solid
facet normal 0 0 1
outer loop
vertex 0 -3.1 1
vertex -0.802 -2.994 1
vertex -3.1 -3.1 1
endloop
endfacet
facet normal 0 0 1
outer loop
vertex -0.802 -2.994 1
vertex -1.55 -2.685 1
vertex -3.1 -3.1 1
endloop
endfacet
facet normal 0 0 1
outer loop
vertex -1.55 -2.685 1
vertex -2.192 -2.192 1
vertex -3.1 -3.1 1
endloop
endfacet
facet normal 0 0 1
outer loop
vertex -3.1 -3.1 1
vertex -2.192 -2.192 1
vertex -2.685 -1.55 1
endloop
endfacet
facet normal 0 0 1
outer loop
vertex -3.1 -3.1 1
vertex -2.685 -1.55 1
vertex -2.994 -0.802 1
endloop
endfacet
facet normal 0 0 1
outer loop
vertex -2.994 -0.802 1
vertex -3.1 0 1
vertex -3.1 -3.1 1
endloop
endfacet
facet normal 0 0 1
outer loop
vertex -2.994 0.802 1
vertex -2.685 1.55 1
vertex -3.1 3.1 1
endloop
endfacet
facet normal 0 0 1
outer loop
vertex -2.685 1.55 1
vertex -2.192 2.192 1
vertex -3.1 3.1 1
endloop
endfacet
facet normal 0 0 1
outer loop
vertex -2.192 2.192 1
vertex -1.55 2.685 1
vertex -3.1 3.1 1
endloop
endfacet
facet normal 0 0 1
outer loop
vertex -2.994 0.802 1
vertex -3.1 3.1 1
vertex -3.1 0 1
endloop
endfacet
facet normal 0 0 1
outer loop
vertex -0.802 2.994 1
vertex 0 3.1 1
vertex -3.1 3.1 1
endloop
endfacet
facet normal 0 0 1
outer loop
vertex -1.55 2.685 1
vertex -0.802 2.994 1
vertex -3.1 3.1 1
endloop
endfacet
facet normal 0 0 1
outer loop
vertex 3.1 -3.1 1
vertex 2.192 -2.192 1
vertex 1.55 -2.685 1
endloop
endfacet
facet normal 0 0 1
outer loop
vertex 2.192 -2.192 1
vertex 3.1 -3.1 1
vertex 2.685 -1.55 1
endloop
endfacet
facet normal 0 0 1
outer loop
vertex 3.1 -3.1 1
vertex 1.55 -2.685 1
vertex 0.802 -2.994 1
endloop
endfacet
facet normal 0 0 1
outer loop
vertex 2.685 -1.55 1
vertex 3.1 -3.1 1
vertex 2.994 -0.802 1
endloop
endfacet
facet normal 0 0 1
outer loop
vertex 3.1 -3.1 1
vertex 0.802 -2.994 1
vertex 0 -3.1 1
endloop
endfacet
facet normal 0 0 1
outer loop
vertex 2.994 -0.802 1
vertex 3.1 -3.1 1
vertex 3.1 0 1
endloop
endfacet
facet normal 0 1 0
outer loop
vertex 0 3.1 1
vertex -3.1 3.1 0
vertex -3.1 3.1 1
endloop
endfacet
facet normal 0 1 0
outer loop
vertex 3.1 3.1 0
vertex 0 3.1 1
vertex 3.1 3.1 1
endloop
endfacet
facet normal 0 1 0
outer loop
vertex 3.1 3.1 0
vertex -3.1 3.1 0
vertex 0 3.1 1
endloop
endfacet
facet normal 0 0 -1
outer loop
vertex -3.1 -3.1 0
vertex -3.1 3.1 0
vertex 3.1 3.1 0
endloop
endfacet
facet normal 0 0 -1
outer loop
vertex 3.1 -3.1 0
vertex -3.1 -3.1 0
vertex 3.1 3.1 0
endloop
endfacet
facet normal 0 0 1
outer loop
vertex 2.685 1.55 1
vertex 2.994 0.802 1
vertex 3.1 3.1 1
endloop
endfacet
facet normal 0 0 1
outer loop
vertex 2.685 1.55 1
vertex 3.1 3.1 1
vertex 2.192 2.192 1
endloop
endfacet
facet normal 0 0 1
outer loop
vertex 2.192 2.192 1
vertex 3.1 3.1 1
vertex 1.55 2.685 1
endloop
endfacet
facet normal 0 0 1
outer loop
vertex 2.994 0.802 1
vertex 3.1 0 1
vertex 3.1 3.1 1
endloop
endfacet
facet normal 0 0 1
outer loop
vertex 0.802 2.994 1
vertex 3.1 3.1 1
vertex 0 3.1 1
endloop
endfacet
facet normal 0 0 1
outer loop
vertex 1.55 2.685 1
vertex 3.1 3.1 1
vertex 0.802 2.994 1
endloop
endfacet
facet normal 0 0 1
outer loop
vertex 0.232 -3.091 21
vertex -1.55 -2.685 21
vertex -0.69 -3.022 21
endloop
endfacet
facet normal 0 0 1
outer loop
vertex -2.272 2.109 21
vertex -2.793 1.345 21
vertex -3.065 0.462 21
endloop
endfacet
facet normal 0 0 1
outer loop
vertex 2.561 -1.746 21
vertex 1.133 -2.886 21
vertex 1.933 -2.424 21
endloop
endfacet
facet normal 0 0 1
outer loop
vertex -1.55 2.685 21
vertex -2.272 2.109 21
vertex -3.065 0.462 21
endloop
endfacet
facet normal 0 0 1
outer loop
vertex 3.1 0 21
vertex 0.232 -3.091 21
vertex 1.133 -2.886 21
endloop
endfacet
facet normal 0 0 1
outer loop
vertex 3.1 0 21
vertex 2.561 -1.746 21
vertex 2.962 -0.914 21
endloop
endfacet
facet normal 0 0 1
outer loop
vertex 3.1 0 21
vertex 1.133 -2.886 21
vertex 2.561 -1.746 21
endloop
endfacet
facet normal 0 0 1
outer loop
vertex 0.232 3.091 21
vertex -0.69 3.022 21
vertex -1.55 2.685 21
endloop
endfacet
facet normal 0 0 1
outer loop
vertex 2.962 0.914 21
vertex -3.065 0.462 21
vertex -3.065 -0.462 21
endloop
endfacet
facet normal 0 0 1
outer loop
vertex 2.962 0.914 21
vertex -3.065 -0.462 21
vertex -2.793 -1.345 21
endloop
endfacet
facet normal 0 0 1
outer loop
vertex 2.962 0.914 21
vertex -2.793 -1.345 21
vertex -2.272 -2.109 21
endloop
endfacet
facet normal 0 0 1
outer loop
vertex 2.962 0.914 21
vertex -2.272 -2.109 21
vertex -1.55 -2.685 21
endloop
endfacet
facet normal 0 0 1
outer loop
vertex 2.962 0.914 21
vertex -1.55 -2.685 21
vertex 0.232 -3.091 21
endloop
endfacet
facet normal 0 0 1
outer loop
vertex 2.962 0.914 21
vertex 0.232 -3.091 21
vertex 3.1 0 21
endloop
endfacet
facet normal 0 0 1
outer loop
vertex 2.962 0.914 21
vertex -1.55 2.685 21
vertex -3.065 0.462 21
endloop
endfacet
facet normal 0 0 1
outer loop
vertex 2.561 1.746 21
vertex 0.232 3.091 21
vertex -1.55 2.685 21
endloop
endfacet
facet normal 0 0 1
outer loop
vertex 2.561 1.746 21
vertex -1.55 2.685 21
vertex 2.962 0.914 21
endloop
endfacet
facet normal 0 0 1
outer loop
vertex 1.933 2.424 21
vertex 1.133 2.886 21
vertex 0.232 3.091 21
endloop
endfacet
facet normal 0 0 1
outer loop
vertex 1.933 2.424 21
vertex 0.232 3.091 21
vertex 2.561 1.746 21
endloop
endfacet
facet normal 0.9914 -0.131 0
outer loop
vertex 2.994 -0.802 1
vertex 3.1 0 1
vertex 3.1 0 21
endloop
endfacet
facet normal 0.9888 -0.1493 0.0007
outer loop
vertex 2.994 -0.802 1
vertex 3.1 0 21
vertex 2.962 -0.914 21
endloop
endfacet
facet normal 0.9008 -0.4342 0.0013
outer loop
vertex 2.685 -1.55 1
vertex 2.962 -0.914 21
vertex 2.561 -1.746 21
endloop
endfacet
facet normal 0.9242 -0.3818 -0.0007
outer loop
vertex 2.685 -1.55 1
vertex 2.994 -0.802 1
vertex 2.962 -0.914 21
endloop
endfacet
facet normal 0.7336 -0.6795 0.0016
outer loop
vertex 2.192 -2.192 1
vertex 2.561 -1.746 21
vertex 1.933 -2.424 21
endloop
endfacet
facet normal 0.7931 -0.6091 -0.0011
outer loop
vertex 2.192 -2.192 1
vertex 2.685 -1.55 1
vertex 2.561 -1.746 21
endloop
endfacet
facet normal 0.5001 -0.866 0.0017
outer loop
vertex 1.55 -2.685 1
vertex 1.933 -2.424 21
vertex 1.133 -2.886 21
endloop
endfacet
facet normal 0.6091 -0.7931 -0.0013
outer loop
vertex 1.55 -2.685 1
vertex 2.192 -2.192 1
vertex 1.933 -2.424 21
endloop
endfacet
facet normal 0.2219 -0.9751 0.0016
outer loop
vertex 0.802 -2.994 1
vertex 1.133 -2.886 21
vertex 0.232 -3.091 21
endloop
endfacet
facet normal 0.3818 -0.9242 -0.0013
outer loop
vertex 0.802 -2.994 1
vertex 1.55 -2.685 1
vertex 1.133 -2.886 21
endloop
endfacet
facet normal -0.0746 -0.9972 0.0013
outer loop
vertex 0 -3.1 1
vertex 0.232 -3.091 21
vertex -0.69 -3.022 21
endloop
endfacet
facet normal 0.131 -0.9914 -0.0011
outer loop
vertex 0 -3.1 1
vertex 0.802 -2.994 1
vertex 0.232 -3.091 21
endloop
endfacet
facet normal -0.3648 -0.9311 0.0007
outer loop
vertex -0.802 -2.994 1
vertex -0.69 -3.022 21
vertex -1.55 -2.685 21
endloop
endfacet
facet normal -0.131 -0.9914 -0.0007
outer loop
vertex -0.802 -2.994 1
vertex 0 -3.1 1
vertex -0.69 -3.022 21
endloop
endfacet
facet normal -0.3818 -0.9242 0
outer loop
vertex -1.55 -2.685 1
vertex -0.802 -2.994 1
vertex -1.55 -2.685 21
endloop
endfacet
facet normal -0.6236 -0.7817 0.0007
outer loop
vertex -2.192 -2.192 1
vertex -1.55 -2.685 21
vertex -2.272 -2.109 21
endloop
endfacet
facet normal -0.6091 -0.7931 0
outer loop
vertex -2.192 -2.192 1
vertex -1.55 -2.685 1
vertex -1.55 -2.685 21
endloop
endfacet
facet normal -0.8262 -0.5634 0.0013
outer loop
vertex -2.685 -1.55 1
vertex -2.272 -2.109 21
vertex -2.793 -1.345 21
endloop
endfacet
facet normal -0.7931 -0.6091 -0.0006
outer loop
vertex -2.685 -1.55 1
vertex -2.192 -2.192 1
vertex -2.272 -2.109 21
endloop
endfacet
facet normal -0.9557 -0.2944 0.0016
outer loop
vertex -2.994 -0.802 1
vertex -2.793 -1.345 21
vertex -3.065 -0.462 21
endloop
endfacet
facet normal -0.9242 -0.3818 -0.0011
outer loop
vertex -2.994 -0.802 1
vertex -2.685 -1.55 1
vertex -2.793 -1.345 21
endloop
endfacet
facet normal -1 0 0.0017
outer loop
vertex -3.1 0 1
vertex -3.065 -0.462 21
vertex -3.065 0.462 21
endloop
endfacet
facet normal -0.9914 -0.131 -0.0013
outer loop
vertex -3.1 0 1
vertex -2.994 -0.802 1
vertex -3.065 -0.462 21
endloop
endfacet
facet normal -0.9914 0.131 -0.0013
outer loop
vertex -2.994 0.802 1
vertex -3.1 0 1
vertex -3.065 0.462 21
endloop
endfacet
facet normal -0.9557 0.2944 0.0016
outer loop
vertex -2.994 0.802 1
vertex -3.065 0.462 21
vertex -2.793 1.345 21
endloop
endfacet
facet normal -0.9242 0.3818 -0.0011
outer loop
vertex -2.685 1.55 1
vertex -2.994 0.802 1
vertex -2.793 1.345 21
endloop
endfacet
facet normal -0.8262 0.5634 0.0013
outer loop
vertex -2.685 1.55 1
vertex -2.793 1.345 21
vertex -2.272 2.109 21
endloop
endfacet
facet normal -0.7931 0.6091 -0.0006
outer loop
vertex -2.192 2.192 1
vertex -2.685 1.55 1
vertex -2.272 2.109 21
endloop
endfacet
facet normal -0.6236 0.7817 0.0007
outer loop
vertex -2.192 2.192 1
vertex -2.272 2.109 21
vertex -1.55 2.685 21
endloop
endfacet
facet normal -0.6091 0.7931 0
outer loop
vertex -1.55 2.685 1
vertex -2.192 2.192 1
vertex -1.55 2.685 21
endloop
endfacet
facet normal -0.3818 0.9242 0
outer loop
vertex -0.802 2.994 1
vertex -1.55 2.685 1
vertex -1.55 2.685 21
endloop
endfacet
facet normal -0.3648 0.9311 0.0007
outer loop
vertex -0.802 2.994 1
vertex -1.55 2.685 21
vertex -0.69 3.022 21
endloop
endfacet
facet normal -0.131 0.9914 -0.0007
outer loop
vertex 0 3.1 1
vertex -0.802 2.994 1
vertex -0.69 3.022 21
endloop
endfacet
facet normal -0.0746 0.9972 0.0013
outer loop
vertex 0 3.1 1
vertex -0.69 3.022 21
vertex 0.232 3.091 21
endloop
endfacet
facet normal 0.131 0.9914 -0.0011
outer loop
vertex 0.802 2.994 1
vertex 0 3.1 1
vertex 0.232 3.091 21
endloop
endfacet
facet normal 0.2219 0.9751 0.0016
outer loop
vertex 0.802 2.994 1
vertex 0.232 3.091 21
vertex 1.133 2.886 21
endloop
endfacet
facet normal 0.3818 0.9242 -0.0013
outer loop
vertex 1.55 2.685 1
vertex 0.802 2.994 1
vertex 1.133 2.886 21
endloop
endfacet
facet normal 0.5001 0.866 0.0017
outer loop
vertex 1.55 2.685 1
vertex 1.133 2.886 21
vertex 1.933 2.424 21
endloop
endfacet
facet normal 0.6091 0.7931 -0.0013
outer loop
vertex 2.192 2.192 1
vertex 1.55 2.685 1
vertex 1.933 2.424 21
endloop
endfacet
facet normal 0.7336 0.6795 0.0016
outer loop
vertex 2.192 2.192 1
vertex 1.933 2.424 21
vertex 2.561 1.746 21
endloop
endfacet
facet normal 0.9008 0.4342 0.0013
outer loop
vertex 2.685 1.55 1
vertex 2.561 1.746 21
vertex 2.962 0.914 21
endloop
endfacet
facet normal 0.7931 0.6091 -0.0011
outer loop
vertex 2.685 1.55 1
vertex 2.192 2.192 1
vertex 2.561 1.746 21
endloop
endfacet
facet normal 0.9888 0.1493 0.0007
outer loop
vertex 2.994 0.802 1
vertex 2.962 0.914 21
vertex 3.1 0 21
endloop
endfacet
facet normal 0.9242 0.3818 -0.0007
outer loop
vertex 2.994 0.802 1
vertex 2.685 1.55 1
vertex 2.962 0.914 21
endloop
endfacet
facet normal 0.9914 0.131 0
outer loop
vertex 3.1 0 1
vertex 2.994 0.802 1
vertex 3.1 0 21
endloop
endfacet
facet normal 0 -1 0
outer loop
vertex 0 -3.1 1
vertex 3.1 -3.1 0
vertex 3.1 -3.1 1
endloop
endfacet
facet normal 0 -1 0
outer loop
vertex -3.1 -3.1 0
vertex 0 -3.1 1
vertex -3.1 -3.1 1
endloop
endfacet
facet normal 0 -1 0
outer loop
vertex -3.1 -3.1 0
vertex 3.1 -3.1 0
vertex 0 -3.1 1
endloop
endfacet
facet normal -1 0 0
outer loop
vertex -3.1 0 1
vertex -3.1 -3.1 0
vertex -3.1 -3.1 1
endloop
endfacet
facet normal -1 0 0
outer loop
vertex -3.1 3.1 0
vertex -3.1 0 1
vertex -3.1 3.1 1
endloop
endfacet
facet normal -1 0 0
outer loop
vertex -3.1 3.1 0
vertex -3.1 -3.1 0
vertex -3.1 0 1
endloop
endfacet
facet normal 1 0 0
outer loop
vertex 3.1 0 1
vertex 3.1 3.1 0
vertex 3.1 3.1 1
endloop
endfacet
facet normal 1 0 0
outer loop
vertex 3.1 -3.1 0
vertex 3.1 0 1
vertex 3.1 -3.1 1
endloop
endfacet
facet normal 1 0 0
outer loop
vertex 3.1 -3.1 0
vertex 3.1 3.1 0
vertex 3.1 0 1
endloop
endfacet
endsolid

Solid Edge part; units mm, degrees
sketch "Sketch1" plane through (0, 0, 0) normal (0, 0, 1) x (1, 0, 0)
  circle A0 centre (0, 0) radius 3.1
extrude "Protrusion1" add sketch "Sketch1" along normal blind 21
sketch "Sketch2" plane through (0, 0, 0) normal (0, 0, -1) x (1, 0, 0)
  line L0 (3.1, 3.1) -> (-3.1, 3.1)
  line L1 (-3.1, 3.1) -> (-3.1, -3.1)
  line L2 (-3.1, -3.1) -> (3.1, -3.1)
  line L3 (3.1, -3.1) -> (3.1, 3.1)
extrude "ExtrudedProtrusion_2" add sketch "Sketch2" against normal blind 1
